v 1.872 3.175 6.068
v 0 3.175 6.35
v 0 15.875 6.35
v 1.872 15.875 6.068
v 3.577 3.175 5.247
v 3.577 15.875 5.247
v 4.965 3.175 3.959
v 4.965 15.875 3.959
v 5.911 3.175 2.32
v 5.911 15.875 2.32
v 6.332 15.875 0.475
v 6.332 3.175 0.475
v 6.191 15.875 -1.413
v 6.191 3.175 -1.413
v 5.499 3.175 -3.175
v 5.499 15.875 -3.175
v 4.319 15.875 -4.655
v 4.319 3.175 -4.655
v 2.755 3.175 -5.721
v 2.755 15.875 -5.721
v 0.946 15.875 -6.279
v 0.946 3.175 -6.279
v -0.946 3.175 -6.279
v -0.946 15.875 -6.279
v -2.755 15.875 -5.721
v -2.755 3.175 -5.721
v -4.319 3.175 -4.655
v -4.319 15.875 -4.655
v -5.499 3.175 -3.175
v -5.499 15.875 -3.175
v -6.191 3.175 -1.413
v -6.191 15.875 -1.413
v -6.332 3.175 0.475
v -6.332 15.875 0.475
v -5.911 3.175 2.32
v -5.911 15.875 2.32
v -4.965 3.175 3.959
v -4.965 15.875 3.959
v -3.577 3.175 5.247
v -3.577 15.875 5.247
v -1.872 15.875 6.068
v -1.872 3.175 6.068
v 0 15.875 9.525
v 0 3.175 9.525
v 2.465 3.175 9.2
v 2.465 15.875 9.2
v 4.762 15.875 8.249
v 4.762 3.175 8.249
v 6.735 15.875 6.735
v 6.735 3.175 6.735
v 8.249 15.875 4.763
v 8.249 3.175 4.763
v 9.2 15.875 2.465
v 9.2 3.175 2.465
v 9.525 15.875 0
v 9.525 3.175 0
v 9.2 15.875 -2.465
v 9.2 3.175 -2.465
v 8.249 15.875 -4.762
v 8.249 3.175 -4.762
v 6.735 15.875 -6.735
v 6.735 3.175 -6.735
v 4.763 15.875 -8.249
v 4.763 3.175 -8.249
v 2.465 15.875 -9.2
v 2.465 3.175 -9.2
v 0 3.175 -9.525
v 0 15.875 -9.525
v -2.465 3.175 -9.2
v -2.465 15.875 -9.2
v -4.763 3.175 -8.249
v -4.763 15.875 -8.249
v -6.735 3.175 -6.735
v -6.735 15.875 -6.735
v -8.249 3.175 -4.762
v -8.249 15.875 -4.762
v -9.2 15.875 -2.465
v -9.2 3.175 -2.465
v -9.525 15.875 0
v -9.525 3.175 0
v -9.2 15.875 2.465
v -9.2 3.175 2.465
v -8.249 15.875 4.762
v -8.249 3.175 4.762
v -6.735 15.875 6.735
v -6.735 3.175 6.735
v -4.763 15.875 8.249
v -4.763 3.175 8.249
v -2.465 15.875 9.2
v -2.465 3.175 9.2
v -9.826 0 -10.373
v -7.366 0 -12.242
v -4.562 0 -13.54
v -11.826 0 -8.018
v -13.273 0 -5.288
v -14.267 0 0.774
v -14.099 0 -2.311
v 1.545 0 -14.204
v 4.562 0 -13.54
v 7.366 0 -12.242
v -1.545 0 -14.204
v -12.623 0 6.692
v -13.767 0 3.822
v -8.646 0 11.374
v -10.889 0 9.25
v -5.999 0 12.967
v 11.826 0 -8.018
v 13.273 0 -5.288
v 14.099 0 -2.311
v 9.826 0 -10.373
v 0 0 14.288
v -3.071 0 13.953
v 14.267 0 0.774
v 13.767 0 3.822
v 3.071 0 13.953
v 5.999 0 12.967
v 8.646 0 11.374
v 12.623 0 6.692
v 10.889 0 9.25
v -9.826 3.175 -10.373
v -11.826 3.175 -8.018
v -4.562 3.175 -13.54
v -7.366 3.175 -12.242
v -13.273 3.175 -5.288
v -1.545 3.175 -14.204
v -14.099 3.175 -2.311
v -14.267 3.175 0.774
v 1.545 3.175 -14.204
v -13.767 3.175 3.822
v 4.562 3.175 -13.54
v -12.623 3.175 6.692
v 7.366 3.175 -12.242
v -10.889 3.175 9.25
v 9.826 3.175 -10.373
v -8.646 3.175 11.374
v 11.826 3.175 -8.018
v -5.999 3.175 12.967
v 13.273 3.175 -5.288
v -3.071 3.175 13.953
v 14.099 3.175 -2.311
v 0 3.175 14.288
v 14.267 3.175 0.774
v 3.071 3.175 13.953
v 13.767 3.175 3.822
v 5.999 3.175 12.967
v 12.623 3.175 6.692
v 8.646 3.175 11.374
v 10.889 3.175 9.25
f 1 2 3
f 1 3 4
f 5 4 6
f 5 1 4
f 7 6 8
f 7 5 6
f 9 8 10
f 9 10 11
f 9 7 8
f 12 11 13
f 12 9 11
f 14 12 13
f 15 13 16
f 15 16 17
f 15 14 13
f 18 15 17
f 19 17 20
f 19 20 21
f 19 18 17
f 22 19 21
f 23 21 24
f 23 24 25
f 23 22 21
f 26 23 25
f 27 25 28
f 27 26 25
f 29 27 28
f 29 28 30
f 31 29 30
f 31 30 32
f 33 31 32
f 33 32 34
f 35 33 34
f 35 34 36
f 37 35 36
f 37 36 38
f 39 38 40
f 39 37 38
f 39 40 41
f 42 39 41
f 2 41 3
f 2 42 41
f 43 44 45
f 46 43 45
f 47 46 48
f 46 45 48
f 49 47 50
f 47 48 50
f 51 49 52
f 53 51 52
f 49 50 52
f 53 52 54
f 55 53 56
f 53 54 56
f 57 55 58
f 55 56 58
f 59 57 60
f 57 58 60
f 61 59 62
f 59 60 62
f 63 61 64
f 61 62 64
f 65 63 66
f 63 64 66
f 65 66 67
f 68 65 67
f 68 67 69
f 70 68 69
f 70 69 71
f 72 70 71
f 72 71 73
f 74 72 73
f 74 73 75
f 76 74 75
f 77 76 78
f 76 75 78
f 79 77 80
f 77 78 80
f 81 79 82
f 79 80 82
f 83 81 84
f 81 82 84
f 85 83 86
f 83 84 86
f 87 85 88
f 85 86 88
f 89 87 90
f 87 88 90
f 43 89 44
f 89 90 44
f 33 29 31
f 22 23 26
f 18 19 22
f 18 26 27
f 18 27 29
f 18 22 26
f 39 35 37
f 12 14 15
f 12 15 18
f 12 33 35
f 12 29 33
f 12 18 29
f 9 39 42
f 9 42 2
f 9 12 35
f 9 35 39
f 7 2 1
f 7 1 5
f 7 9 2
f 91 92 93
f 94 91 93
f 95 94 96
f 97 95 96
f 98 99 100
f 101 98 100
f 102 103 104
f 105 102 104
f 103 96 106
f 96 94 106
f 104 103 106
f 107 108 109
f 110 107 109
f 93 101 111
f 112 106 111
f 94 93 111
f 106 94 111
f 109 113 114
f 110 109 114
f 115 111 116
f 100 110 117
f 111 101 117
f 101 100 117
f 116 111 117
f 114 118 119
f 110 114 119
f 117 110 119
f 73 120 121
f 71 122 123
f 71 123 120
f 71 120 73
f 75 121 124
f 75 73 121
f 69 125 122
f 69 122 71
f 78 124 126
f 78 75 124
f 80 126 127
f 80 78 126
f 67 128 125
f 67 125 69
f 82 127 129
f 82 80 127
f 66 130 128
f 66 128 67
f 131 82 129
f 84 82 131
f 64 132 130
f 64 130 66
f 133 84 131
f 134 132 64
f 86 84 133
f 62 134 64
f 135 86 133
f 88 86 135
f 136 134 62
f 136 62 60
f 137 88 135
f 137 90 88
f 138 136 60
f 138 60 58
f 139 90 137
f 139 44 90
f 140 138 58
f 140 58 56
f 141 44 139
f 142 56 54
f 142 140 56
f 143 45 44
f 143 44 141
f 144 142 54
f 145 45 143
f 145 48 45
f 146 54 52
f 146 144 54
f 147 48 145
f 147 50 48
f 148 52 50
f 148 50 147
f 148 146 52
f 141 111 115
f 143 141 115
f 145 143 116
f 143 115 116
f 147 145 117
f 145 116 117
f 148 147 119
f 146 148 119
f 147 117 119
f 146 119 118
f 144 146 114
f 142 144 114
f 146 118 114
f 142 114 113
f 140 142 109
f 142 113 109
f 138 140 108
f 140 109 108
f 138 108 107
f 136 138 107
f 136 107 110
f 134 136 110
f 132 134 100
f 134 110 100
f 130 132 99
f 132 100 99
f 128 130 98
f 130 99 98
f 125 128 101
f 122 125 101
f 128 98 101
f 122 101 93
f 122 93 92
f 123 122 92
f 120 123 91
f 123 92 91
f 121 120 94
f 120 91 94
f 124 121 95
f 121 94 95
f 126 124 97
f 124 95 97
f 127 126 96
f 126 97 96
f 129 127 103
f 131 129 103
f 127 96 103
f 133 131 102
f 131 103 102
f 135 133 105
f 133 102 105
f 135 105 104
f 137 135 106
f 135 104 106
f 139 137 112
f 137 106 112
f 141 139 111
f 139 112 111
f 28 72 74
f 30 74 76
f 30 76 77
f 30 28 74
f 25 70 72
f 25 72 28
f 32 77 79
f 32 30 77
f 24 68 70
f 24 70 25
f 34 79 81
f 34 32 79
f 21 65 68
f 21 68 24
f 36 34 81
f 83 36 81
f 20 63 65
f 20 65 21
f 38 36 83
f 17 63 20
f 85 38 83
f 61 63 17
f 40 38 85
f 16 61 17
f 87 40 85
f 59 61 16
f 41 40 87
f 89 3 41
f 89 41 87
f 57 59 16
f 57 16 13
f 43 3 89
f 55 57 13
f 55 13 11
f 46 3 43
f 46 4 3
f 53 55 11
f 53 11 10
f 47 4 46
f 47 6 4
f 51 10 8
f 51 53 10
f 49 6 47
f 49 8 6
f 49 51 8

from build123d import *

# Parameters (mm, degrees)
SKETCH1_R           = 14.2875
BOSS_EXTRUDE1_DEPTH = 3.175
SKETCH2_R           = 9.525
SKETCH2_R_2         = 6.35
BOSS_EXTRUDE2_DEPTH = 12.7


with BuildPart() as part:
    # Sketch1 → Boss-Extrude1 (new body)
    with BuildSketch(Plane(origin=(0, 0, 0), x_dir=(1, 0, 0), z_dir=(0, 1, 0))):
        with Locations(Location((0, 0, 0), (0, 0, 270))):
            Circle(SKETCH1_R)
    extrude(amount=BOSS_EXTRUDE1_DEPTH)

    # Sketch2 → Boss-Extrude2 (add)
    with BuildSketch(Plane(origin=(0, 3.175, 0), x_dir=(1, 0, 0), z_dir=(0, 1, 0))):
        with Locations(Location((0, 0, 0), (0, 0, 270))):
            Circle(SKETCH2_R)
        with Locations(Location((0, 0, 0), (0, 0, 270))):
            Circle(SKETCH2_R_2, mode=Mode.SUBTRACT)
    extrude(amount=BOSS_EXTRUDE2_DEPTH)


solid = part.part
